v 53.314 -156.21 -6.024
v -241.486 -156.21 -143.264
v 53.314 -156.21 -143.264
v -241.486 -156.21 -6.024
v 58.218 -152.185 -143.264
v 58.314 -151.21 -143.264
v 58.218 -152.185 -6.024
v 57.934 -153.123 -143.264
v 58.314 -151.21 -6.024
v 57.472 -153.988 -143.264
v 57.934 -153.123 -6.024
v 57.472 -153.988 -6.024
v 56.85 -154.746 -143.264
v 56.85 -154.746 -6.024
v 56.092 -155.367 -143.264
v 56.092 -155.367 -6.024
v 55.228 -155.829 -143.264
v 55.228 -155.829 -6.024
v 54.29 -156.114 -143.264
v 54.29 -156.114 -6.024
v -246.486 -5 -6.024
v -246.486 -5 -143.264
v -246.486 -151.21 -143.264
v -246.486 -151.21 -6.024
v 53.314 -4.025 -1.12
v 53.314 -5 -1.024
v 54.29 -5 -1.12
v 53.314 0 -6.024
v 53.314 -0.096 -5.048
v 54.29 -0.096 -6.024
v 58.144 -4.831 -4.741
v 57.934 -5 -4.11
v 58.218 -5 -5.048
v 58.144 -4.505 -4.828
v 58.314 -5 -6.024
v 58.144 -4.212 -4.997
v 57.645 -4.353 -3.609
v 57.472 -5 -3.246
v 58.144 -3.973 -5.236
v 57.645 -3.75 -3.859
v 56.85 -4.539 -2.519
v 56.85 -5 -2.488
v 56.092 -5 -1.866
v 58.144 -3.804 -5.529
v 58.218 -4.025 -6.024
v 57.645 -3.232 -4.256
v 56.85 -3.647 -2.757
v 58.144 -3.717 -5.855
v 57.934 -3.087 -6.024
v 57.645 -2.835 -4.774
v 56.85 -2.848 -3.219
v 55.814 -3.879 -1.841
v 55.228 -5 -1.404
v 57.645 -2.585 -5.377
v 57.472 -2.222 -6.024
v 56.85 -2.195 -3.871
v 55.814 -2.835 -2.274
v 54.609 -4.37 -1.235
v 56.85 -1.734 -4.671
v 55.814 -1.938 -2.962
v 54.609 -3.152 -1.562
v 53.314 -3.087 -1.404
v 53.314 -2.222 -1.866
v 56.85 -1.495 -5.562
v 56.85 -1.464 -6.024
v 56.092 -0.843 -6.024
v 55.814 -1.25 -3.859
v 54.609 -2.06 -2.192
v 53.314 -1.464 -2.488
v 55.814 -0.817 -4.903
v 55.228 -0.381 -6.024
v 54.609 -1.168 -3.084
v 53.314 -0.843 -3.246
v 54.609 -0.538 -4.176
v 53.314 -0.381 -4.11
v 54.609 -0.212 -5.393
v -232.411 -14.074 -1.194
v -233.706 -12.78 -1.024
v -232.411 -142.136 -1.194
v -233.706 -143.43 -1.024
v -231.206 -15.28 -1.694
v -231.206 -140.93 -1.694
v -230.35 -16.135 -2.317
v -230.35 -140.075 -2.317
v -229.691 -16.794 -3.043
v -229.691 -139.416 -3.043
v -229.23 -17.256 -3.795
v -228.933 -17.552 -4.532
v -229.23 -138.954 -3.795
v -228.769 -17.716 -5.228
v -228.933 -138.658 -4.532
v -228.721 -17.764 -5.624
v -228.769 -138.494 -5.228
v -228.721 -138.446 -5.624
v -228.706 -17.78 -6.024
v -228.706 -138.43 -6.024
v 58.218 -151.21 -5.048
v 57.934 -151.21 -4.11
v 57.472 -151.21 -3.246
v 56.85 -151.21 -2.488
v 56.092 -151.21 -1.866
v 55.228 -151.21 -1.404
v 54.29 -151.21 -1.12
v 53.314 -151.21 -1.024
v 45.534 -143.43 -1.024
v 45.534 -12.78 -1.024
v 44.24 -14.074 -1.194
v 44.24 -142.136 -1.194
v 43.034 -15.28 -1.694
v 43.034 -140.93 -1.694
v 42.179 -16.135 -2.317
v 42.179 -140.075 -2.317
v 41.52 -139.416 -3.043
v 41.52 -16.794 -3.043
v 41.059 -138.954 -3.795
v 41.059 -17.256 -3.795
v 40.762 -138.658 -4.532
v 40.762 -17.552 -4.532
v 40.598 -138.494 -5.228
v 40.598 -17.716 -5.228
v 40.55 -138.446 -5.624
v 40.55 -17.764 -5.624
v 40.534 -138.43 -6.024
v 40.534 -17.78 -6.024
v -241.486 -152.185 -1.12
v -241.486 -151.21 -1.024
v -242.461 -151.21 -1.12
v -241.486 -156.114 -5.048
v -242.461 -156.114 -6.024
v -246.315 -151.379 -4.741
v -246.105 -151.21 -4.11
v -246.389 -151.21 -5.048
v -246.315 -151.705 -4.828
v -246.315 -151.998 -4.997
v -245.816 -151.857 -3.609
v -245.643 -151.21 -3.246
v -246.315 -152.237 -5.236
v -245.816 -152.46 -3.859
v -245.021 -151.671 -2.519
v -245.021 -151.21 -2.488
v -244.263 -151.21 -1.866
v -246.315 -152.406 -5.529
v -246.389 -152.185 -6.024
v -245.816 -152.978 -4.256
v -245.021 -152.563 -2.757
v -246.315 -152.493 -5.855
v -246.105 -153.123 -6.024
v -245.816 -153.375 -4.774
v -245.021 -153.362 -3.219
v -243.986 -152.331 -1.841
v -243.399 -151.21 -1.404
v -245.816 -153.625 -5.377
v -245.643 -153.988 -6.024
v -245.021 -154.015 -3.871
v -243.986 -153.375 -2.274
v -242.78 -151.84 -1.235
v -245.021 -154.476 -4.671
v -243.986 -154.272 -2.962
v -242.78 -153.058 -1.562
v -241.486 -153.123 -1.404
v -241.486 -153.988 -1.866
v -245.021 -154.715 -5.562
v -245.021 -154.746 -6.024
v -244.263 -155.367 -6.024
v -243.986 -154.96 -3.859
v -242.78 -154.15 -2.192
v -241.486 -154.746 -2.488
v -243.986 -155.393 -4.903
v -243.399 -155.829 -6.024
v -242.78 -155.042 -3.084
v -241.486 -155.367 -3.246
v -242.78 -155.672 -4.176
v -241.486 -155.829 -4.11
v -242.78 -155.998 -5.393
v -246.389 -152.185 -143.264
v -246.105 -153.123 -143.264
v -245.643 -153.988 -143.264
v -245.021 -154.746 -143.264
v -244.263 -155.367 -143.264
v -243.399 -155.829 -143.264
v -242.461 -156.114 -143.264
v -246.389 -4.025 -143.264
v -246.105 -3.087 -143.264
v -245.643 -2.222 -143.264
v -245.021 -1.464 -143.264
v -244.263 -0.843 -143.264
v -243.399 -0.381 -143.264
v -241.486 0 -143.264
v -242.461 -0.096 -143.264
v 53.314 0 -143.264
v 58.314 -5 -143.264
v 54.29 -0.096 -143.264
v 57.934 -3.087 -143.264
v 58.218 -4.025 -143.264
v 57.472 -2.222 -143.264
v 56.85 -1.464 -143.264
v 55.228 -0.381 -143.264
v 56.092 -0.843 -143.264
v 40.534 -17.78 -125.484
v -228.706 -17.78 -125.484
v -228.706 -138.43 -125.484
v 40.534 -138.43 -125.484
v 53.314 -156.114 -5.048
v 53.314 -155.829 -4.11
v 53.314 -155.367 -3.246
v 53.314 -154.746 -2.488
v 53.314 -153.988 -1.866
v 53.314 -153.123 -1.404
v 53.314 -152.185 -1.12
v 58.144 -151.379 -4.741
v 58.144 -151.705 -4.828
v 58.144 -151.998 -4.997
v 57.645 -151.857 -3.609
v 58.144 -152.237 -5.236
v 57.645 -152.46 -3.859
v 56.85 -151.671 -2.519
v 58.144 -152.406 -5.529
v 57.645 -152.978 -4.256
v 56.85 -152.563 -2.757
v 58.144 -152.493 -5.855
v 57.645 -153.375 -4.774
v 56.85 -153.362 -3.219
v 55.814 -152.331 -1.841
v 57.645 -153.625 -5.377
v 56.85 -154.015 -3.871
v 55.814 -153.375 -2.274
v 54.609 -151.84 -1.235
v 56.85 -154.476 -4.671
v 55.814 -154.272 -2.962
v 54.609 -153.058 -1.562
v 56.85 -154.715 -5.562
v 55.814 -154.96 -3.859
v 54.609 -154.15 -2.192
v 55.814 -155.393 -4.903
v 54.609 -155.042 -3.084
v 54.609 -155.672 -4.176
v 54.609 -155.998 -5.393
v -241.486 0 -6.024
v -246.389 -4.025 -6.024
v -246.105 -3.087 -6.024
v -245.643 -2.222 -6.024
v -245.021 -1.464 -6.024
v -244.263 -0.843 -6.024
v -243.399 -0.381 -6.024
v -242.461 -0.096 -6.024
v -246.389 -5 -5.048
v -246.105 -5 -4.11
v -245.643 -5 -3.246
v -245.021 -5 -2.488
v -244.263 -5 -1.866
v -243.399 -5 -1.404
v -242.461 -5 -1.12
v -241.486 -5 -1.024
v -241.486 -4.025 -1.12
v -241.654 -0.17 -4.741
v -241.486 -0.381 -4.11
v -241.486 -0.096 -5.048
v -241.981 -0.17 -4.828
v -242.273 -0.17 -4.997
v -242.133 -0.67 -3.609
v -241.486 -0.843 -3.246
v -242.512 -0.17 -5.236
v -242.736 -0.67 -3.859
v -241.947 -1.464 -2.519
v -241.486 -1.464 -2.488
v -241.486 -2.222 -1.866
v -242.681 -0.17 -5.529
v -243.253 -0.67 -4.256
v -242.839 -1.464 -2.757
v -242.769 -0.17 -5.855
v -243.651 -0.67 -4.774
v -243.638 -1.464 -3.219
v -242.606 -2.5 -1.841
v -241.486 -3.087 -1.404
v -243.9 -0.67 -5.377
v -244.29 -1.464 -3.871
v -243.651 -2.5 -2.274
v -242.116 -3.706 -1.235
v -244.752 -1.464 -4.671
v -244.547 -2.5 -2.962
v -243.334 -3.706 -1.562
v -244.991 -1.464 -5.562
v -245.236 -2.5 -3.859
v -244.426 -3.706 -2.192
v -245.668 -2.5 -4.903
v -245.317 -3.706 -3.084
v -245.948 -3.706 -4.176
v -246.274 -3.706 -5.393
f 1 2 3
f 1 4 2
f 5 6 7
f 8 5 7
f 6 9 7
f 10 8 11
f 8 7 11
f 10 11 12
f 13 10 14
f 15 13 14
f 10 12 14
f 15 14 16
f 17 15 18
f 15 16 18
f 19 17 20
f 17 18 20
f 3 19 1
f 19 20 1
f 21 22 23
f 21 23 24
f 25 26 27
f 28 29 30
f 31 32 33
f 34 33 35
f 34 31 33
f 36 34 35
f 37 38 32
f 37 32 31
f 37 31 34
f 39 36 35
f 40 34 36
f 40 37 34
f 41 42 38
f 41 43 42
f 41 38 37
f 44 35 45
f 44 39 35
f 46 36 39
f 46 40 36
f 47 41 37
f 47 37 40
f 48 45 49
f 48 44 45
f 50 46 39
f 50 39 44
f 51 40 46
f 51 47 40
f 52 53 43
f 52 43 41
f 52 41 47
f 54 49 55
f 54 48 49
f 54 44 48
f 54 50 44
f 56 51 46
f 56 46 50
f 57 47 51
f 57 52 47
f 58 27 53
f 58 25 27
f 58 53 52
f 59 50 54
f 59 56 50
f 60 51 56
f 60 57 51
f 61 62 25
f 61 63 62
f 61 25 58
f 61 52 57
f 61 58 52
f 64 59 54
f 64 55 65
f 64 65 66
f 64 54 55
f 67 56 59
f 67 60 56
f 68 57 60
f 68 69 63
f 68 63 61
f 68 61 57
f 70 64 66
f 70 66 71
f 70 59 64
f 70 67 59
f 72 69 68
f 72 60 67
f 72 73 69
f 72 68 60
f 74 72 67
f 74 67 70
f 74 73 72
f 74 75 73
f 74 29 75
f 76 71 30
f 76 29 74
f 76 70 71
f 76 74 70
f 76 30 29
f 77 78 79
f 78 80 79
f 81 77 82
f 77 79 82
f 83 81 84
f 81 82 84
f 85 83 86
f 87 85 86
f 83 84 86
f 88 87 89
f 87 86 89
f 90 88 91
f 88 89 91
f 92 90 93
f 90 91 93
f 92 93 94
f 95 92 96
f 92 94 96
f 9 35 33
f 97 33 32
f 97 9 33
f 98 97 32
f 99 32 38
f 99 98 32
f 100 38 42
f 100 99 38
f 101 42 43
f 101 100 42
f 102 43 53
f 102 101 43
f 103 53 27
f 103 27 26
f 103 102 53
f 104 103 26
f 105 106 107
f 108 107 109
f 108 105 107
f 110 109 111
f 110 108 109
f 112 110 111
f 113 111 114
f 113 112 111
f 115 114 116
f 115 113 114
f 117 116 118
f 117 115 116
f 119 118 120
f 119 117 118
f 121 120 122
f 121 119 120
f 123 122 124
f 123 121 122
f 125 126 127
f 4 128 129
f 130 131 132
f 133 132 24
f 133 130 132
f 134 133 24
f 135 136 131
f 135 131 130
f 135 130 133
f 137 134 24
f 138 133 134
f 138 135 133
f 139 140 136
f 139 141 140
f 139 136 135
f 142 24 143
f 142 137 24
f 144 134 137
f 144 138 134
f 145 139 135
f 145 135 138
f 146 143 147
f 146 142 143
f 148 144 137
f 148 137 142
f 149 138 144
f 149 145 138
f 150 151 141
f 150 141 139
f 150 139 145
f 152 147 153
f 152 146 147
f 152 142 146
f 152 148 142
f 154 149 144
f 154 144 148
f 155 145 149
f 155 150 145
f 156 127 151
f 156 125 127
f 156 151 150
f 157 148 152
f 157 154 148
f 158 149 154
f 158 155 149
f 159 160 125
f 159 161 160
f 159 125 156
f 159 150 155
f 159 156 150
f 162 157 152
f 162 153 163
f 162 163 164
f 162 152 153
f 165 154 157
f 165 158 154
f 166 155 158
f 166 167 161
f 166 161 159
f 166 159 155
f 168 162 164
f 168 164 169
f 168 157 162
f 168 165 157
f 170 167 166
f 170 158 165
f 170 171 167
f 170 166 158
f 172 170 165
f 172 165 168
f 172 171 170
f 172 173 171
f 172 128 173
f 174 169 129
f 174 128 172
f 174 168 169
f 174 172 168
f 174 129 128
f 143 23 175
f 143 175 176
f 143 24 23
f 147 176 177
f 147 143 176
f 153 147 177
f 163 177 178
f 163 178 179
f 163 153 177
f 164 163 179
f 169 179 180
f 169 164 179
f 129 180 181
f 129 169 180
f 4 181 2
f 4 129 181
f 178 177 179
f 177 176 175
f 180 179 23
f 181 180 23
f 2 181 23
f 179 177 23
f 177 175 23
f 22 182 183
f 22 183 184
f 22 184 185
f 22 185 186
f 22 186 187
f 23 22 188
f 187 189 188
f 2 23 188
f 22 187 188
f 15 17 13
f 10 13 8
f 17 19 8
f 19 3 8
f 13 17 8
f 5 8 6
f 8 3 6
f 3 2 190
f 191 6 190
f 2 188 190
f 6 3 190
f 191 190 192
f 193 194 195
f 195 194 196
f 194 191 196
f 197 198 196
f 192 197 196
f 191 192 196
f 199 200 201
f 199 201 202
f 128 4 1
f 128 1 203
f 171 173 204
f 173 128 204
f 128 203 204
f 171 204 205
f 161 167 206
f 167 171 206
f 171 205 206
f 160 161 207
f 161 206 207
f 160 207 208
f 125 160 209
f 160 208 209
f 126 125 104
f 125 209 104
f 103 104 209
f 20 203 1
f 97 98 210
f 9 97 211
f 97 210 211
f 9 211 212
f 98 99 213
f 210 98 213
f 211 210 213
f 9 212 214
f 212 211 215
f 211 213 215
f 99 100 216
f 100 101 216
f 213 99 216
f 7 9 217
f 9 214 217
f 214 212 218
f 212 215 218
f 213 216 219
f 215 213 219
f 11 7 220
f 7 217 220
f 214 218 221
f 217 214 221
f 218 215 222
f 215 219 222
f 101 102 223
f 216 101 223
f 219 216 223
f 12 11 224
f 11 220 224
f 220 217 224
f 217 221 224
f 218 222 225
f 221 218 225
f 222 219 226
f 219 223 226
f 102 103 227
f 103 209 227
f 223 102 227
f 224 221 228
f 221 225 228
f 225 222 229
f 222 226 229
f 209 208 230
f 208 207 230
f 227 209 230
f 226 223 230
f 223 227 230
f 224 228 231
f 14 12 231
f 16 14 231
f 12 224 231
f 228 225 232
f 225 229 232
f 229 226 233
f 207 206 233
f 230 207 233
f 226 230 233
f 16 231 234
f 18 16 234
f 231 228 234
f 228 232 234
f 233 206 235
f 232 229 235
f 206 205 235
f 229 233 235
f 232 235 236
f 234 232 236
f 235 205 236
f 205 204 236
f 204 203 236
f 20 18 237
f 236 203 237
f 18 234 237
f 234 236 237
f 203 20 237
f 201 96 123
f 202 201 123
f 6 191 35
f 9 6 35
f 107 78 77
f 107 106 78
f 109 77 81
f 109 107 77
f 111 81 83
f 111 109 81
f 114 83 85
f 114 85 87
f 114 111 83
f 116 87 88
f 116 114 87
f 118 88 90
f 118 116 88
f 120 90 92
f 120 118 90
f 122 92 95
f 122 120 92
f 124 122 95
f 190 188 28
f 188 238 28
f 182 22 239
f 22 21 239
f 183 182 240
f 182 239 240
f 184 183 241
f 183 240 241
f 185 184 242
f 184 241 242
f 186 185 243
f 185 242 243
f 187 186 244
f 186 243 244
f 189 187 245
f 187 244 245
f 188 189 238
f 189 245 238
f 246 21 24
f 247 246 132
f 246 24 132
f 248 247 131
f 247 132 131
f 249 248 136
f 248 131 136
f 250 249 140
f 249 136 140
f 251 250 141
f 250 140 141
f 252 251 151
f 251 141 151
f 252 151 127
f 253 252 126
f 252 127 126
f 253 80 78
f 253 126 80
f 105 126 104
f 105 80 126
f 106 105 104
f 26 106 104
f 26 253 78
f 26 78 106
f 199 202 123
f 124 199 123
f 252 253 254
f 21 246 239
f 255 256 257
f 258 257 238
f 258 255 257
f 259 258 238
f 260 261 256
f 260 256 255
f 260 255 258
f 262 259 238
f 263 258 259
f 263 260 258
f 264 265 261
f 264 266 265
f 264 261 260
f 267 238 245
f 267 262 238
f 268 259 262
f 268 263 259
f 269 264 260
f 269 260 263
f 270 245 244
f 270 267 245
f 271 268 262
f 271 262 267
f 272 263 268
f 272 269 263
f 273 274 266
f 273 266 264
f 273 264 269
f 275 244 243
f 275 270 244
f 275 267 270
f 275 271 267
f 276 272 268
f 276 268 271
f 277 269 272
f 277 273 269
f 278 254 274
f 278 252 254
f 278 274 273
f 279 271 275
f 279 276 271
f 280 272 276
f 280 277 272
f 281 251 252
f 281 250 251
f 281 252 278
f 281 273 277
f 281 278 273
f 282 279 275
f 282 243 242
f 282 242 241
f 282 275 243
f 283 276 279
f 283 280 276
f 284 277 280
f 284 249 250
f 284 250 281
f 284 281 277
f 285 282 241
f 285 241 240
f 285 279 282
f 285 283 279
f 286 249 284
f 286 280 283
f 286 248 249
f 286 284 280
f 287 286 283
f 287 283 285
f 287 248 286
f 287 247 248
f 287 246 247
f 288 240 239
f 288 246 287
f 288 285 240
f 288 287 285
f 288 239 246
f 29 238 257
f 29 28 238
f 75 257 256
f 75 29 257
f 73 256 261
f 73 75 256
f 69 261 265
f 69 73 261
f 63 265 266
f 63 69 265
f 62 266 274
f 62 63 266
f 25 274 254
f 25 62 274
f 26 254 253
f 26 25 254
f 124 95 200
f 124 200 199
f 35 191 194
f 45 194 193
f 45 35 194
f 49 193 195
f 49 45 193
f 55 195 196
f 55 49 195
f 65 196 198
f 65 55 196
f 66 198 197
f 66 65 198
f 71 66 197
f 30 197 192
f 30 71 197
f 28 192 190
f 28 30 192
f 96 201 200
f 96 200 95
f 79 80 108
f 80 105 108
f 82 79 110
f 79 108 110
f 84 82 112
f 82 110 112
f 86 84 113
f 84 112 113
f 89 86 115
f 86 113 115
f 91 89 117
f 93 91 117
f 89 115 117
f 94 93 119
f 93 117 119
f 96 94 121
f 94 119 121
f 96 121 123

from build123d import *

# Parameters (mm, degrees)
F0_W     = 304.8
F0_H     = 142.2400027159
F1_DEPTH = 156.21
F2_T     = -17.78
F4_R     = 5


with BuildPart() as f1:
    # F0 (on Front) → F1 (new body)
    with BuildSketch(Plane.XZ):
        with Locations((-94.085527584, 5.834210664)):
            Rectangle(F0_W, F0_H)
    extrude(amount=F1_DEPTH)

    # F2
    f2_openings = [f1.faces().sort_by_distance(p)[0] for p in [
        (-94.085528, -78.105, 76.954212),
    ]]
    offset(amount=F2_T, openings=f2_openings)


with BuildPart() as f1_1:
    # F3: moved
    add(f1.part.moved(Location((0, 0, -77.978))))

    # F4
    f4_edges = [f1_1.edges().sort_by_distance(p)[0] for p in [
        (-94.085528, -156.21, -1.023788),
        (-246.485528, -78.105, -1.023788),
        (-94.085528, 0, -1.023788),
        (58.314472, -78.105, -1.023788),
        (40.534472, -78.105, -1.023788),
        (-94.085528, -138.43, -1.023788),
        (-94.085528, -17.78, -1.023788),
        (-228.705528, -78.105, -1.023788),
        (-246.485528, -156.21, -72.143789),
        (58.314472, -156.21, -72.143789),
        (-246.485528, 0, -72.143789),
        (58.314472, 0, -72.143789),
    ]]
    fillet(f4_edges, radius=F4_R)


solid = f1_1.part
